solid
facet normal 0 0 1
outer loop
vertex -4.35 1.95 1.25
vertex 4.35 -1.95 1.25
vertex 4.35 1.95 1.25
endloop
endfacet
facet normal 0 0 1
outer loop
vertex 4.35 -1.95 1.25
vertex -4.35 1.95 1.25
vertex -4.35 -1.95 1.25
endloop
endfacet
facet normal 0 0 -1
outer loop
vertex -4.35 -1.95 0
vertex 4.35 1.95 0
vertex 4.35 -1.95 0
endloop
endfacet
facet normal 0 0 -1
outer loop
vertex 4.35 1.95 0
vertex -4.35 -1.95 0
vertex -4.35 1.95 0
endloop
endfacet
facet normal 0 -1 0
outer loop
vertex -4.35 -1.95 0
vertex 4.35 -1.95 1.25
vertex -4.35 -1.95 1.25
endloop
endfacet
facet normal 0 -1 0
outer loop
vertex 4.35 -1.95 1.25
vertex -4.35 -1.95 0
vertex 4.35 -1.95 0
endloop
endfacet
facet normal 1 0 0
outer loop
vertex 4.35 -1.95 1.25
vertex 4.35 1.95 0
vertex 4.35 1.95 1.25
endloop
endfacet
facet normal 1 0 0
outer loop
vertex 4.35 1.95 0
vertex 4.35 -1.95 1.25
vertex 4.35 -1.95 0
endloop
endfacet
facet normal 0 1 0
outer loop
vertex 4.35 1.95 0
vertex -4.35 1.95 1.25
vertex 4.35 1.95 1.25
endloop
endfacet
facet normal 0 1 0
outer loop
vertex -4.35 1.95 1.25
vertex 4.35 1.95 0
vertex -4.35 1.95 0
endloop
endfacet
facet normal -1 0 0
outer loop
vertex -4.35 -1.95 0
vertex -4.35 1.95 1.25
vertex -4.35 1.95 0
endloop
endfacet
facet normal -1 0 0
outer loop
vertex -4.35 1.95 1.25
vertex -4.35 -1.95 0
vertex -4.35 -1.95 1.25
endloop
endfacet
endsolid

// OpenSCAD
$fn=64;

module smd_body(size=[8.70, 3.90, 1.25]) {
    translate([0,0,size[2]/2])
        cube(size, center=true);
}

smd_body([8.70, 3.90, 1.25]);
